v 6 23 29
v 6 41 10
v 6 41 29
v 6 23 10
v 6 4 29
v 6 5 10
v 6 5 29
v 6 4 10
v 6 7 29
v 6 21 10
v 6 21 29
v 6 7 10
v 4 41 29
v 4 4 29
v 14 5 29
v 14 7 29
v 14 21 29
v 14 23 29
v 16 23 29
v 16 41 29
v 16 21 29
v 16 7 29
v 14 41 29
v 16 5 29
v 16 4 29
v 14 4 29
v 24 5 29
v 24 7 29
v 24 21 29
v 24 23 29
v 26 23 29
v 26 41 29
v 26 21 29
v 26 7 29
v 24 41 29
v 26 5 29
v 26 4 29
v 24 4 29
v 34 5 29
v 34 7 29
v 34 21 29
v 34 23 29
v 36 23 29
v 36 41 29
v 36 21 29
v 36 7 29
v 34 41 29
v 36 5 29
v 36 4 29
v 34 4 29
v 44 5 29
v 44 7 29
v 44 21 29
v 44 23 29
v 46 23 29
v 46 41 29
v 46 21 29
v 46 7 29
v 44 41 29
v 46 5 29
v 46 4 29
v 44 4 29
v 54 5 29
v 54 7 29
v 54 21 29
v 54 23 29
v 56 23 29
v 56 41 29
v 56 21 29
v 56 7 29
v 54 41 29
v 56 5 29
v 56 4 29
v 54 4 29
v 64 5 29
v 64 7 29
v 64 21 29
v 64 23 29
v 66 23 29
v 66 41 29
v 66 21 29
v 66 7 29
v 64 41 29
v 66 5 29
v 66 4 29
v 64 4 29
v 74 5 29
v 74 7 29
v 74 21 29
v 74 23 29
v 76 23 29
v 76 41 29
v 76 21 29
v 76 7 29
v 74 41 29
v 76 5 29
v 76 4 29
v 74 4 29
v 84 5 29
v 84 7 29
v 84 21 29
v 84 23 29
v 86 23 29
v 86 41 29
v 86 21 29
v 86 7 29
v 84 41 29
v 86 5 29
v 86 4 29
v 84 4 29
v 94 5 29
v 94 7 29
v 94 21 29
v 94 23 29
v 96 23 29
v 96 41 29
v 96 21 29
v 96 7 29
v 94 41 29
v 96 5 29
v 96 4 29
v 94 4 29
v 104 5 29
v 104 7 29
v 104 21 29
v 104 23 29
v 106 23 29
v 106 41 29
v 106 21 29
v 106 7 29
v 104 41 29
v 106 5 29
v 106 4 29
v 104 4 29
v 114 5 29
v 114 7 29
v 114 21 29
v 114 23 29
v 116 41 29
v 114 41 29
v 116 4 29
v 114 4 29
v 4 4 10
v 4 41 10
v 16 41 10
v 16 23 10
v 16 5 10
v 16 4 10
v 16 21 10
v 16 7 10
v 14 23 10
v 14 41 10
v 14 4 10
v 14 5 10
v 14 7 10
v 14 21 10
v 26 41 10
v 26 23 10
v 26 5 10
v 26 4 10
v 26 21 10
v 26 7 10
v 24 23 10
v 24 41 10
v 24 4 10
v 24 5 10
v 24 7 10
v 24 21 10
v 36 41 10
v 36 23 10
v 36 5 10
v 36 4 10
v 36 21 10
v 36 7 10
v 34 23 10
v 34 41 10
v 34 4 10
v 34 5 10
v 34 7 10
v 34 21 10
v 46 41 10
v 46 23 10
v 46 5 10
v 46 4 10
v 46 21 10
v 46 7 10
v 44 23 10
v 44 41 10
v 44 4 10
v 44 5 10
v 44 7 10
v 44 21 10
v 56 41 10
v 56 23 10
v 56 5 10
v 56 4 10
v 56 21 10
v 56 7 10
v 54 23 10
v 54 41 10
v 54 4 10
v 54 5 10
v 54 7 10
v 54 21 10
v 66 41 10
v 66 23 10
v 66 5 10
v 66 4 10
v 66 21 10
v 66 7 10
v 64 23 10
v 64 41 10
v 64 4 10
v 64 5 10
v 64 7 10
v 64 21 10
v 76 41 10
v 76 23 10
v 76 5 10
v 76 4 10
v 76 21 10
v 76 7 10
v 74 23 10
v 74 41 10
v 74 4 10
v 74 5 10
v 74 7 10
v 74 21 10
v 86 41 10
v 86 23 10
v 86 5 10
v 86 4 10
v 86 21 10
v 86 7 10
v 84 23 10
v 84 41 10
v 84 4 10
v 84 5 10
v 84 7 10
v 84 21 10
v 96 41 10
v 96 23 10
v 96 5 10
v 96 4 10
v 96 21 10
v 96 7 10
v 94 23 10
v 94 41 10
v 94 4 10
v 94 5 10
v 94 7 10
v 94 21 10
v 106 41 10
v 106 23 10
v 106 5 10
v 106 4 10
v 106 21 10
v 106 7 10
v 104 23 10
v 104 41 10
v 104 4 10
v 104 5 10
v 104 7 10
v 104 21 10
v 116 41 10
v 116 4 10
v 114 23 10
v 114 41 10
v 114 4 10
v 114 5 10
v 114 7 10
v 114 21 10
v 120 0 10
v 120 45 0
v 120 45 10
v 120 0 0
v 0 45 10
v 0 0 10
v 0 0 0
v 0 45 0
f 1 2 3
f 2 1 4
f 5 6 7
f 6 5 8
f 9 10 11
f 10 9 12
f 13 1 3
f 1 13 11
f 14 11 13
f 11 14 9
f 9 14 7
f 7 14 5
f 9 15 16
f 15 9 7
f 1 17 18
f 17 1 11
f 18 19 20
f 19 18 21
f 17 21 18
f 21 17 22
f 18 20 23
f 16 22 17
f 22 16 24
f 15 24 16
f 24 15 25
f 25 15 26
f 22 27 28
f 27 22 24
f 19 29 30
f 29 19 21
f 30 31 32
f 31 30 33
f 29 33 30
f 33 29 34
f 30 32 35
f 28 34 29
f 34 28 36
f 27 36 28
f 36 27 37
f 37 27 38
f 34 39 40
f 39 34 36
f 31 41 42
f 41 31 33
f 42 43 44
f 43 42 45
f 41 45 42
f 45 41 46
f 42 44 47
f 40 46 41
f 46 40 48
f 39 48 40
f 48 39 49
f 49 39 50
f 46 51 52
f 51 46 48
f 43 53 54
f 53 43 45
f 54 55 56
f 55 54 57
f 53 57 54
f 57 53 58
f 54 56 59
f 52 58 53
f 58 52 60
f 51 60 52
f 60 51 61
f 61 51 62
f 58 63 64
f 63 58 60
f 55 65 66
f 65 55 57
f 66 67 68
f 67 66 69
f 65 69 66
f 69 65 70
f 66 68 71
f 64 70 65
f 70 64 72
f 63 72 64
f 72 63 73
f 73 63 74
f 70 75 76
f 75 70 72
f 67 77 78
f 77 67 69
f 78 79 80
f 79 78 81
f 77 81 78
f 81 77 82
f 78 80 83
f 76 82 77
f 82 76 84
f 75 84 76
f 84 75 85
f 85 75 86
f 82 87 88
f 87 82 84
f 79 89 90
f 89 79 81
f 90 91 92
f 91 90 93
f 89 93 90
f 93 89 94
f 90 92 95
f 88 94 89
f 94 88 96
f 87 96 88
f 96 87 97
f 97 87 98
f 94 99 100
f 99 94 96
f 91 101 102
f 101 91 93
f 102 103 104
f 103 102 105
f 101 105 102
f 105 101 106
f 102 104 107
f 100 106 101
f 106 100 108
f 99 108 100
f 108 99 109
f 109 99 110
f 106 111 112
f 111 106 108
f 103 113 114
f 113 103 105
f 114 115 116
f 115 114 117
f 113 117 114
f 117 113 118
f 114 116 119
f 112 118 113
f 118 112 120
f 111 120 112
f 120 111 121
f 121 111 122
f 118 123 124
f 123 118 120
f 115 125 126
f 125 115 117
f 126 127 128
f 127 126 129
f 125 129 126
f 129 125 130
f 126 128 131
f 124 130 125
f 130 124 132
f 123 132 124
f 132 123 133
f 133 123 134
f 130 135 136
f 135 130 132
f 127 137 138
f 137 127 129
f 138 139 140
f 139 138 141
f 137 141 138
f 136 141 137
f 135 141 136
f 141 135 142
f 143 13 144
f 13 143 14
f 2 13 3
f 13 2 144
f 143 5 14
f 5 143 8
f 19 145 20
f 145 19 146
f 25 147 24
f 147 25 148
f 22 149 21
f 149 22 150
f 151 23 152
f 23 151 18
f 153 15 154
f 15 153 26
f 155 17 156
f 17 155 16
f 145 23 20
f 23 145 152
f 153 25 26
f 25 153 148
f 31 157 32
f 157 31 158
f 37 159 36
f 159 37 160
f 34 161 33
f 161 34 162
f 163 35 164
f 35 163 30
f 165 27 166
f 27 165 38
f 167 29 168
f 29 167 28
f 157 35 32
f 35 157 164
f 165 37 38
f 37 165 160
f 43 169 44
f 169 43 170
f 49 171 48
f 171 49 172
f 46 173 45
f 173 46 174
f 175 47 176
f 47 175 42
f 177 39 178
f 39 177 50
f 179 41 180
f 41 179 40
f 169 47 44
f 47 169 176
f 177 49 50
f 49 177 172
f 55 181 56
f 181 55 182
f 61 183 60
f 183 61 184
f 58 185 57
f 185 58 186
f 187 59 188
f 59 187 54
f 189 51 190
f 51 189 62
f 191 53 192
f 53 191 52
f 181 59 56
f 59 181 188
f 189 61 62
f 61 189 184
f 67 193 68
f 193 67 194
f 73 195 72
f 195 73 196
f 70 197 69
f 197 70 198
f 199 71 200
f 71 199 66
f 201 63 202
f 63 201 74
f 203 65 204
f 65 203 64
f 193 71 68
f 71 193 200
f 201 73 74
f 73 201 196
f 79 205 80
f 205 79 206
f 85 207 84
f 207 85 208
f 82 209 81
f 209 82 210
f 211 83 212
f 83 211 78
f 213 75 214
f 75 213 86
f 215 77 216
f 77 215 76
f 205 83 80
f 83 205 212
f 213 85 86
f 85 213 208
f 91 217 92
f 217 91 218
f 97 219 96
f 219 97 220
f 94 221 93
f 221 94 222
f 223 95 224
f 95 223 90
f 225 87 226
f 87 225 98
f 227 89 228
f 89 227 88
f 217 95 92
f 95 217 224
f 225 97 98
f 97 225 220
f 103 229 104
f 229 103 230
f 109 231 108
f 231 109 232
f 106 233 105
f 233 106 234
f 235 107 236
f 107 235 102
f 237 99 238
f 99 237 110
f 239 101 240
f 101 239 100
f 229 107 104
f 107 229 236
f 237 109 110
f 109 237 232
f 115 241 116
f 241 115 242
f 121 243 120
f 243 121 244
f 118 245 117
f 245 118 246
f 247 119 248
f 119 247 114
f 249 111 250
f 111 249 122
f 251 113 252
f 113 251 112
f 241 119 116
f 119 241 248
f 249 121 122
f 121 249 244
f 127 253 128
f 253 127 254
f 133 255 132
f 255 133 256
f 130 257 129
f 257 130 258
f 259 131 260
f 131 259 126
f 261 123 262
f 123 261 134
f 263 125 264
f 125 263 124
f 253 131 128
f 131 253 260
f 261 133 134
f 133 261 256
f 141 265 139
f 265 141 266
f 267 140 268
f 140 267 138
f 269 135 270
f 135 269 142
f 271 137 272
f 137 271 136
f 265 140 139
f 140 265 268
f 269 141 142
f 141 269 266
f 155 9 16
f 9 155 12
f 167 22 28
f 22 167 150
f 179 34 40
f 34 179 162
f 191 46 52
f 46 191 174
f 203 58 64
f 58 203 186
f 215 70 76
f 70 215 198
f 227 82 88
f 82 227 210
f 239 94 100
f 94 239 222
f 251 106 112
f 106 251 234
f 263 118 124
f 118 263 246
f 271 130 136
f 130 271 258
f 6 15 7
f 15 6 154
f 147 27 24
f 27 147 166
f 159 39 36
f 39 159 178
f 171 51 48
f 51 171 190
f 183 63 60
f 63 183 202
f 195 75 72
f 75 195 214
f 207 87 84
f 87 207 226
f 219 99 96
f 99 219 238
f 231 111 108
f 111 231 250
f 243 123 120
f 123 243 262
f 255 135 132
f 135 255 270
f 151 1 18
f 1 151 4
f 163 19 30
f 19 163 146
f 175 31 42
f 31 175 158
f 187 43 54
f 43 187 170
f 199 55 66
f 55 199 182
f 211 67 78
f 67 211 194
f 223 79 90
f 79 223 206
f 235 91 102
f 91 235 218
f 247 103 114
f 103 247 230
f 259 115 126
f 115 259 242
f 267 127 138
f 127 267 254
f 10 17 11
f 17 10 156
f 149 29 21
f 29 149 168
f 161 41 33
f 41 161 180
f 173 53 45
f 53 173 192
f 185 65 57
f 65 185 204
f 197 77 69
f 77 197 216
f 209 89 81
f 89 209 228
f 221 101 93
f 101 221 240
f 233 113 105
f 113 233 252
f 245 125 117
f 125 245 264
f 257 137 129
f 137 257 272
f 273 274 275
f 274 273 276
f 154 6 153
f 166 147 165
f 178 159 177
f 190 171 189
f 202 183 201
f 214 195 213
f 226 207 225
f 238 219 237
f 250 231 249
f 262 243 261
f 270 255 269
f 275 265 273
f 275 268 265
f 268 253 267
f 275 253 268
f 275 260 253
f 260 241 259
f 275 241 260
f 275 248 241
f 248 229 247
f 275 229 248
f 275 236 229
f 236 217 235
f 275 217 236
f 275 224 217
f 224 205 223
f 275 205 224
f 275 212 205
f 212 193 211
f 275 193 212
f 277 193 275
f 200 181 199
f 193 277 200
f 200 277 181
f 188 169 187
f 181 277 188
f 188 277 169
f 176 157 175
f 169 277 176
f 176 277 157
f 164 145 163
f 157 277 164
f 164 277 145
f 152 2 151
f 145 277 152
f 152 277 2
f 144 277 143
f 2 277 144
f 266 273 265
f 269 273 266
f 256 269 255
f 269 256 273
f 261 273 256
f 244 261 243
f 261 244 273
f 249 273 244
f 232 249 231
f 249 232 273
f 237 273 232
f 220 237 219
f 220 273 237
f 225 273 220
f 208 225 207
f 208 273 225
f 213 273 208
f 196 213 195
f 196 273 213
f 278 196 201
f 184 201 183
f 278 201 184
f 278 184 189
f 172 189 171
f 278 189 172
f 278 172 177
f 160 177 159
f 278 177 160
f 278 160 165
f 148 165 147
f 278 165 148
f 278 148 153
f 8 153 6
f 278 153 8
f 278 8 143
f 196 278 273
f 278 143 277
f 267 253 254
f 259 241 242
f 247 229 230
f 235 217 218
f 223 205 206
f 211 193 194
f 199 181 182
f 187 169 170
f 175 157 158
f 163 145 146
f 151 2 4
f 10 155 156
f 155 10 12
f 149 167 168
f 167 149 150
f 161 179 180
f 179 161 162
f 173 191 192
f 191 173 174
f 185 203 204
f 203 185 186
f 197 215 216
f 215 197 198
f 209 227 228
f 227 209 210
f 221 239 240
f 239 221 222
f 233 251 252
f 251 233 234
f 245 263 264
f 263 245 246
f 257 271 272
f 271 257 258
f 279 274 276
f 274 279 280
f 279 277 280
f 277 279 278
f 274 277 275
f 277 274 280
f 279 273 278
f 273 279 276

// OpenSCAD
$fn = 32;

// ----------------------------------------------------------------------
// Heatsink: cross fin block
// ----------------------------------------------------------------------

// --- parameters (mm) ---
base_l = 120;             // base length, X
base_w = 45;              // base width, Y
base_t = 10;              // base plate thickness
fin_h = 20;               // fin height above the base
fin_t = 2;                // fin thickness
edge = 4;                 // margin from the base ends
pitch = 10;               // fin pitch
rib_pitch = 16;           // cross rib pitch

n_fins = floor((base_l - 2 * edge - fin_t) / pitch) + 1;  // fin count
total_h = base_t + fin_h - 1;  // overall height
n_ribs = floor((base_w - 2 * edge) / rib_pitch);  // rib count

union() {
  cube([base_l, base_w, base_t]);
  for (i = [0 : n_fins - 1])
    translate([edge + i * pitch, edge, base_t - 1])
      cube([fin_t, base_w - 2 * edge, fin_h]);
  for (i = [0 : n_ribs - 1])
    translate([edge, edge + 1 + i * rib_pitch, base_t - 1])
      cube([base_l - 2 * edge, fin_t, fin_h]);
}
